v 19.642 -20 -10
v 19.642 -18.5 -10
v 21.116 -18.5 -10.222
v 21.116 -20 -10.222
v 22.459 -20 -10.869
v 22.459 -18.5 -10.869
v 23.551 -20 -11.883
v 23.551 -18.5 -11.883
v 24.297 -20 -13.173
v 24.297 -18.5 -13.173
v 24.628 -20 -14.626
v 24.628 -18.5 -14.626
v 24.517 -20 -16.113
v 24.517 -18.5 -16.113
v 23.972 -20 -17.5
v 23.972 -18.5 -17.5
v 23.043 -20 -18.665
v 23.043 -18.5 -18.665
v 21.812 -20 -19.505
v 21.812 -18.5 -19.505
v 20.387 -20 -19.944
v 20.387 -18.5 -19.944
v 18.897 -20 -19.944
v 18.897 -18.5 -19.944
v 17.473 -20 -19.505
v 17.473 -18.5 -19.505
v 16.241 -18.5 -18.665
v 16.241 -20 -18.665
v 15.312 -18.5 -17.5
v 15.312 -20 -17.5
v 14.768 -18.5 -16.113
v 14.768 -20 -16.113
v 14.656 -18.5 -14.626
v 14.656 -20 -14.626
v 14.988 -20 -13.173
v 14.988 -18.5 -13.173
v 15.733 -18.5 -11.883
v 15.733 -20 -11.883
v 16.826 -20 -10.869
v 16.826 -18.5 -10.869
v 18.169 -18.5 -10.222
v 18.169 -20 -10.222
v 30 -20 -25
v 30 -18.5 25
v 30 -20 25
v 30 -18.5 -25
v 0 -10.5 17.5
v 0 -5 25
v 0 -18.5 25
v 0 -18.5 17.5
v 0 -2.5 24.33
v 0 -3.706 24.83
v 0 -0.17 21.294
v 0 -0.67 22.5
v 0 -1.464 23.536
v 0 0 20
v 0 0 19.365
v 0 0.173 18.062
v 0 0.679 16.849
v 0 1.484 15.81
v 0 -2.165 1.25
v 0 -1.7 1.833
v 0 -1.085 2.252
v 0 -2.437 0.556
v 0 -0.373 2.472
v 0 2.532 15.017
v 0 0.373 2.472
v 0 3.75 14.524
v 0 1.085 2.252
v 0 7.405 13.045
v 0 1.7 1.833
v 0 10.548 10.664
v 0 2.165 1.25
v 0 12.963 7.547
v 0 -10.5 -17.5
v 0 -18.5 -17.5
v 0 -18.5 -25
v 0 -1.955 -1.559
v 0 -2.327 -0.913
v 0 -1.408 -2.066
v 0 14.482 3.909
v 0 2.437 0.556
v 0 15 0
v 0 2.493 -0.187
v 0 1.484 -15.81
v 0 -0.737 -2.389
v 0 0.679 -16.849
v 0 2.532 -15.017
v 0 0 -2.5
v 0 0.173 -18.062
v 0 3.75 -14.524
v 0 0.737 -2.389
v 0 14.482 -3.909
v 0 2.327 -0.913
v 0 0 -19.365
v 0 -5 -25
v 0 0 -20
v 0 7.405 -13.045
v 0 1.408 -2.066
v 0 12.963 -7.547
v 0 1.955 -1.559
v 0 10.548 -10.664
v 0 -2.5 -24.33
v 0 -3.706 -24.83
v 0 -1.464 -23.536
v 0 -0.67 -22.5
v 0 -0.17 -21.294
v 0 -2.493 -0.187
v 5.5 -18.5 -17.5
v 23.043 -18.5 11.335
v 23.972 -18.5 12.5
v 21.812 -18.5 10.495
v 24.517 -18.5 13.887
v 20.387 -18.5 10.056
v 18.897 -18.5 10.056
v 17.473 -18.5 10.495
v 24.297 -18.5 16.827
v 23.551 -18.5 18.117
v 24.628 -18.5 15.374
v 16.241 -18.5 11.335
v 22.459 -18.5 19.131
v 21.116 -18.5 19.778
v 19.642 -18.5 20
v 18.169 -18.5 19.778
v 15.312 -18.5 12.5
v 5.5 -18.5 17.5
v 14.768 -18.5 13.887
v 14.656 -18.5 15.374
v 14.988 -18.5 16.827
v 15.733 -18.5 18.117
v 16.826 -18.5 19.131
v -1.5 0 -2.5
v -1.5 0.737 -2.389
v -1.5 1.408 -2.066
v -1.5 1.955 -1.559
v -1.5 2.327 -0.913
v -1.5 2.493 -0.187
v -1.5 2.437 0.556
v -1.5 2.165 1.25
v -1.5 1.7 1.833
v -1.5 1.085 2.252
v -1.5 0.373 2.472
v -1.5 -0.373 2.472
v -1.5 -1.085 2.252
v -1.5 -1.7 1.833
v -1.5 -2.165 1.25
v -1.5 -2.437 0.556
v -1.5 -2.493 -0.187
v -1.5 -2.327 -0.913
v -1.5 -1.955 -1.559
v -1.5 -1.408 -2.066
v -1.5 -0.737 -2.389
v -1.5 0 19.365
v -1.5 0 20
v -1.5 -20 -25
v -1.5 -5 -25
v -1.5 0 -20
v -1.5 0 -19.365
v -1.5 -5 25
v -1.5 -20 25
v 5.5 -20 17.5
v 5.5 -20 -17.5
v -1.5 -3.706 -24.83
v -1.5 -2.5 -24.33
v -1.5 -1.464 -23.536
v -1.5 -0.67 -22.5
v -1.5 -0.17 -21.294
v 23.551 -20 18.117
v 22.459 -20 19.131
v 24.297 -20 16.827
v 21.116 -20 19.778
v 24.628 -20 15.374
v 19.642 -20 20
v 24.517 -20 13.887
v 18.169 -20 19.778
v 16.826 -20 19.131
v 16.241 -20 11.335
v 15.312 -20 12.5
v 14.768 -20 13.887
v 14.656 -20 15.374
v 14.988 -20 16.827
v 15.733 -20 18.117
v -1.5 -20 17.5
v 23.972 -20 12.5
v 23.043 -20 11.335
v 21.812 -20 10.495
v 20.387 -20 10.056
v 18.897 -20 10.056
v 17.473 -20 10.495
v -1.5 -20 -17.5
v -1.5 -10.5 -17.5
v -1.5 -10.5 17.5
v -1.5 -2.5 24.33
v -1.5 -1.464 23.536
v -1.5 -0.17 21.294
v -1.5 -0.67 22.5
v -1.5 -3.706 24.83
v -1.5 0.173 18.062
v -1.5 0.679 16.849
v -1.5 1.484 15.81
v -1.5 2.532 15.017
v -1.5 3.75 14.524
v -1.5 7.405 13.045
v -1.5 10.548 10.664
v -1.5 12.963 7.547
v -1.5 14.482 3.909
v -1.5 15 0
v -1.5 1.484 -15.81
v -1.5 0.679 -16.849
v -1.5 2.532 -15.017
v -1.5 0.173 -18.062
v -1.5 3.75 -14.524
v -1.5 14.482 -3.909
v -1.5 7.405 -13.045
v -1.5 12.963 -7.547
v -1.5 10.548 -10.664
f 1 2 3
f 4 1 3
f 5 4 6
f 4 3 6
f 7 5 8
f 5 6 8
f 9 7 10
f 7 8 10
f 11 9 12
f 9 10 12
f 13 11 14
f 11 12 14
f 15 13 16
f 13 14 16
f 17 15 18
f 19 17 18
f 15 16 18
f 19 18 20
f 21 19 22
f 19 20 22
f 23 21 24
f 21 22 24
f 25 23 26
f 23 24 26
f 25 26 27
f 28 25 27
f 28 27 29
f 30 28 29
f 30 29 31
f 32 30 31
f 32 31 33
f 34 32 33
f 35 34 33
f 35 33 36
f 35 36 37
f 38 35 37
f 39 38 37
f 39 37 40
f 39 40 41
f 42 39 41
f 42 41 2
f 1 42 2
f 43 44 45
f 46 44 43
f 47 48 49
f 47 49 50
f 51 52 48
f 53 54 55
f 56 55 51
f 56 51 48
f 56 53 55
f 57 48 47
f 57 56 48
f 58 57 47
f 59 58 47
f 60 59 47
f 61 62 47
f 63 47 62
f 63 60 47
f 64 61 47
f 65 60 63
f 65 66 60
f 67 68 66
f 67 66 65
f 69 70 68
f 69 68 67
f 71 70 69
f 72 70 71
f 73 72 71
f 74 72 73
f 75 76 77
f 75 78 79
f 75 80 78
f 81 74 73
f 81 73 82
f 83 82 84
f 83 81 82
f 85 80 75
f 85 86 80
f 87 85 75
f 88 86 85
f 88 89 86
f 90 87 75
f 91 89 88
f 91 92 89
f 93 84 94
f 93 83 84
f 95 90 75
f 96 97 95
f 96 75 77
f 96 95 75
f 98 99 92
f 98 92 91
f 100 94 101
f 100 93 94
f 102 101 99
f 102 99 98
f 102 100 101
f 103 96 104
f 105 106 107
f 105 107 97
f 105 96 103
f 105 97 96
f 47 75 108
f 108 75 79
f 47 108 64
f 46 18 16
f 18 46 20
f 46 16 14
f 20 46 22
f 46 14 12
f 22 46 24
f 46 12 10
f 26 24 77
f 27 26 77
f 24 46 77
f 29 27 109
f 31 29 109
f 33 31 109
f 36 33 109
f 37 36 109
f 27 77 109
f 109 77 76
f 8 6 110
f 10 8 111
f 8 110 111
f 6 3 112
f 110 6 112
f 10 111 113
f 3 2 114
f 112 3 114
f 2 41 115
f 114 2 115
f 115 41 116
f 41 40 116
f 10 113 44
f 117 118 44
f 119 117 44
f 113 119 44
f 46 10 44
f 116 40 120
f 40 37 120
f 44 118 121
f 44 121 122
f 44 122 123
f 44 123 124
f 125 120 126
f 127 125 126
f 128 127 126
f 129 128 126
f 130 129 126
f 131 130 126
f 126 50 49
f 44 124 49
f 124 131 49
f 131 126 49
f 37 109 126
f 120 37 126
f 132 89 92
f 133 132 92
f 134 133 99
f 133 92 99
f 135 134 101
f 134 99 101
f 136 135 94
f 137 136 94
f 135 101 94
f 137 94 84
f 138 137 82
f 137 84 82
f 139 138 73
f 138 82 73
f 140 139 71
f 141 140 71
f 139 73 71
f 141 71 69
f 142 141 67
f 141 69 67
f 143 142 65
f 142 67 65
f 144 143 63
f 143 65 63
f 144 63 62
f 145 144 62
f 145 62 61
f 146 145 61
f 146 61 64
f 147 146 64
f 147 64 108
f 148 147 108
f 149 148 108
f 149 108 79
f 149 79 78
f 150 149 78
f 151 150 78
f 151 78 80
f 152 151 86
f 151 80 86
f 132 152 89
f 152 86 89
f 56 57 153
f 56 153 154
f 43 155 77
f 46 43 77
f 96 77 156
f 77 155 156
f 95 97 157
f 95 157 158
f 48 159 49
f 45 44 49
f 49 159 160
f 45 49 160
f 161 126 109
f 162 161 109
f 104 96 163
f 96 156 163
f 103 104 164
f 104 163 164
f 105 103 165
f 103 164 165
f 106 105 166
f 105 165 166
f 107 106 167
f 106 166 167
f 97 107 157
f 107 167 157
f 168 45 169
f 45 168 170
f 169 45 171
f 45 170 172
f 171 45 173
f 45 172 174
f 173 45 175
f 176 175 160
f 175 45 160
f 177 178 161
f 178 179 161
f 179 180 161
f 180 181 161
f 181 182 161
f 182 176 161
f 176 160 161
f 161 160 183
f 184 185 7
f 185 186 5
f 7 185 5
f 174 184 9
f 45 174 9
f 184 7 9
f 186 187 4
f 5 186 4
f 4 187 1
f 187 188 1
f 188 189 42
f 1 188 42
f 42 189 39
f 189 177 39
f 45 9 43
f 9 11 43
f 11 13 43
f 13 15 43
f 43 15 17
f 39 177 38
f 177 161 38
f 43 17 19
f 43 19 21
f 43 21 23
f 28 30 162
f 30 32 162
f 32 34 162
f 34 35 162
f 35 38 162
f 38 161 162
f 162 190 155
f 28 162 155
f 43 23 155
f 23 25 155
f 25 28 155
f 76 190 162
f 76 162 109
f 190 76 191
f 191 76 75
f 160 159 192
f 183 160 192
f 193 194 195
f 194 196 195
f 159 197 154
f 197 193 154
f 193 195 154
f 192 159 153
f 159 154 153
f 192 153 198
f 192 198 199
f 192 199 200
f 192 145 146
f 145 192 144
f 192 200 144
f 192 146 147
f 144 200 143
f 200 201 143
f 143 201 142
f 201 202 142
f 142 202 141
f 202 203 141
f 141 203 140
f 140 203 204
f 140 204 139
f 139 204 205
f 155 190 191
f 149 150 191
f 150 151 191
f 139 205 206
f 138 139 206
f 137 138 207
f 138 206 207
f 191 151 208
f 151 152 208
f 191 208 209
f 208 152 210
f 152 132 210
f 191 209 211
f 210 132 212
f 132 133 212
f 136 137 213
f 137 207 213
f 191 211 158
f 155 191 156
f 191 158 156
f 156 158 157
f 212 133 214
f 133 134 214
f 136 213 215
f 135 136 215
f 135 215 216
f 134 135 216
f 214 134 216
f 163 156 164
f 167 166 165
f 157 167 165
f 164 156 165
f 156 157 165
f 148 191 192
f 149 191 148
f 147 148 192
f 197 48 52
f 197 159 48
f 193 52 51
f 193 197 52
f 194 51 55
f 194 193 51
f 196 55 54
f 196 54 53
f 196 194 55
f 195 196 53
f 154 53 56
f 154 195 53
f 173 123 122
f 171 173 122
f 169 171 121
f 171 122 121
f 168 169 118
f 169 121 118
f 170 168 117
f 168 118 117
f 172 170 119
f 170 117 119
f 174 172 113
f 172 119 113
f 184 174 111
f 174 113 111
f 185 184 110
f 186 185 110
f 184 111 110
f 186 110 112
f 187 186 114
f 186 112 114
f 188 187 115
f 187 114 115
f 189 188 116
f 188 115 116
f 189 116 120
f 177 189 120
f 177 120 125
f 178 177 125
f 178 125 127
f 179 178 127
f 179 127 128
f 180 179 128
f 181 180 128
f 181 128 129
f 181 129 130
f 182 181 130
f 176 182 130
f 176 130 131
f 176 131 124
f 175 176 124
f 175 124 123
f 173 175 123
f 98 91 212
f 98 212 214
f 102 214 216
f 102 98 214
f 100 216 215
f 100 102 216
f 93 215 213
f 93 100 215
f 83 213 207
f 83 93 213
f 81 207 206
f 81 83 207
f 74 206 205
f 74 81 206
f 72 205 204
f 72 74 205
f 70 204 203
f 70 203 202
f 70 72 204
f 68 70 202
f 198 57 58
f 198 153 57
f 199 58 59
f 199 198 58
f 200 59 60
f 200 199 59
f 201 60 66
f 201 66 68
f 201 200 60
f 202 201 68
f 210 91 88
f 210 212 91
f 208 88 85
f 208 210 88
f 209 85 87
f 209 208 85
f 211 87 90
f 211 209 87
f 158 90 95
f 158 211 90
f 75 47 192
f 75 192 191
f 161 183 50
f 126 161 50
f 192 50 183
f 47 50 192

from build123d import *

# Parameters (mm, degrees)
SKETCH1_W           = 35
SKETCH1_H           = 8
SKETCH1_R           = 2.5
BOSS_EXTRUDE1_DEPTH = 1.5
BOSS_EXTRUDE2_DEPTH = 30
FILLET1_R           = 5
SKETCH2_R           = 5
SKETCH2_W           = 7
SKETCH2_H           = 35
CUT_EXTRUDE1_DEPTH  = 30


with BuildPart() as part:
    # Sketch1 → Boss-Extrude1 (new body)
    with BuildSketch(Plane(origin=(0, 0, 0), x_dir=(0, 0, -1), z_dir=(1, 0, 0))):
        with BuildLine():
            Line((25, 0), (15, 0))
            ThreePointArc((15, 0), (0, 15), (-15, 0))
            Line((-15, 0), (-25, 0))
            Line((-25, 0), (-25, -20))
            Line((-25, -20), (25, -20))
            Line((25, -20), (25, 0))
        make_face()
        with Locations((0, -14.5)):
            Rectangle(SKETCH1_W, SKETCH1_H, mode=Mode.SUBTRACT)
        Circle(SKETCH1_R, mode=Mode.SUBTRACT)
    extrude(amount=-BOSS_EXTRUDE1_DEPTH)

    # Sketch1<3> → Boss-Extrude2 (add)
    with BuildSketch(Plane(origin=(0, 0, 0), x_dir=(0, 0, -1), z_dir=(1, 0, 0))):
        Polygon((25, -20), (25, -18.5), (17.5, -18.5), (-17.5, -18.5), (-25, -18.5), (-25, -20), align=None)
    extrude(amount=BOSS_EXTRUDE2_DEPTH)

    # Fillet1
    fillet1_edges = [part.edges().sort_by_distance(p)[0] for p in [
        (-0.75, 0, -15),
        (-0.75, 0, 15),
        (-0.75, 0, -25),
        (-0.75, 0, 25),
    ]]
    fillet(fillet1_edges, radius=FILLET1_R)

    # Sketch2 → Cut-Extrude1 (cut)
    with BuildSketch(Plane(origin=(0, -18.5, 0), x_dir=(1, 0, 0), z_dir=(0, 1, 0))):
        with Locations((19.642277283, 15)):
            Circle(SKETCH2_R)
        with Locations((19.642277283, -15)):
            Circle(SKETCH2_R)
        with Locations((2, 0)):
            Rectangle(SKETCH2_W, SKETCH2_H)
    extrude(amount=-CUT_EXTRUDE1_DEPTH, mode=Mode.SUBTRACT)


solid = part.part
